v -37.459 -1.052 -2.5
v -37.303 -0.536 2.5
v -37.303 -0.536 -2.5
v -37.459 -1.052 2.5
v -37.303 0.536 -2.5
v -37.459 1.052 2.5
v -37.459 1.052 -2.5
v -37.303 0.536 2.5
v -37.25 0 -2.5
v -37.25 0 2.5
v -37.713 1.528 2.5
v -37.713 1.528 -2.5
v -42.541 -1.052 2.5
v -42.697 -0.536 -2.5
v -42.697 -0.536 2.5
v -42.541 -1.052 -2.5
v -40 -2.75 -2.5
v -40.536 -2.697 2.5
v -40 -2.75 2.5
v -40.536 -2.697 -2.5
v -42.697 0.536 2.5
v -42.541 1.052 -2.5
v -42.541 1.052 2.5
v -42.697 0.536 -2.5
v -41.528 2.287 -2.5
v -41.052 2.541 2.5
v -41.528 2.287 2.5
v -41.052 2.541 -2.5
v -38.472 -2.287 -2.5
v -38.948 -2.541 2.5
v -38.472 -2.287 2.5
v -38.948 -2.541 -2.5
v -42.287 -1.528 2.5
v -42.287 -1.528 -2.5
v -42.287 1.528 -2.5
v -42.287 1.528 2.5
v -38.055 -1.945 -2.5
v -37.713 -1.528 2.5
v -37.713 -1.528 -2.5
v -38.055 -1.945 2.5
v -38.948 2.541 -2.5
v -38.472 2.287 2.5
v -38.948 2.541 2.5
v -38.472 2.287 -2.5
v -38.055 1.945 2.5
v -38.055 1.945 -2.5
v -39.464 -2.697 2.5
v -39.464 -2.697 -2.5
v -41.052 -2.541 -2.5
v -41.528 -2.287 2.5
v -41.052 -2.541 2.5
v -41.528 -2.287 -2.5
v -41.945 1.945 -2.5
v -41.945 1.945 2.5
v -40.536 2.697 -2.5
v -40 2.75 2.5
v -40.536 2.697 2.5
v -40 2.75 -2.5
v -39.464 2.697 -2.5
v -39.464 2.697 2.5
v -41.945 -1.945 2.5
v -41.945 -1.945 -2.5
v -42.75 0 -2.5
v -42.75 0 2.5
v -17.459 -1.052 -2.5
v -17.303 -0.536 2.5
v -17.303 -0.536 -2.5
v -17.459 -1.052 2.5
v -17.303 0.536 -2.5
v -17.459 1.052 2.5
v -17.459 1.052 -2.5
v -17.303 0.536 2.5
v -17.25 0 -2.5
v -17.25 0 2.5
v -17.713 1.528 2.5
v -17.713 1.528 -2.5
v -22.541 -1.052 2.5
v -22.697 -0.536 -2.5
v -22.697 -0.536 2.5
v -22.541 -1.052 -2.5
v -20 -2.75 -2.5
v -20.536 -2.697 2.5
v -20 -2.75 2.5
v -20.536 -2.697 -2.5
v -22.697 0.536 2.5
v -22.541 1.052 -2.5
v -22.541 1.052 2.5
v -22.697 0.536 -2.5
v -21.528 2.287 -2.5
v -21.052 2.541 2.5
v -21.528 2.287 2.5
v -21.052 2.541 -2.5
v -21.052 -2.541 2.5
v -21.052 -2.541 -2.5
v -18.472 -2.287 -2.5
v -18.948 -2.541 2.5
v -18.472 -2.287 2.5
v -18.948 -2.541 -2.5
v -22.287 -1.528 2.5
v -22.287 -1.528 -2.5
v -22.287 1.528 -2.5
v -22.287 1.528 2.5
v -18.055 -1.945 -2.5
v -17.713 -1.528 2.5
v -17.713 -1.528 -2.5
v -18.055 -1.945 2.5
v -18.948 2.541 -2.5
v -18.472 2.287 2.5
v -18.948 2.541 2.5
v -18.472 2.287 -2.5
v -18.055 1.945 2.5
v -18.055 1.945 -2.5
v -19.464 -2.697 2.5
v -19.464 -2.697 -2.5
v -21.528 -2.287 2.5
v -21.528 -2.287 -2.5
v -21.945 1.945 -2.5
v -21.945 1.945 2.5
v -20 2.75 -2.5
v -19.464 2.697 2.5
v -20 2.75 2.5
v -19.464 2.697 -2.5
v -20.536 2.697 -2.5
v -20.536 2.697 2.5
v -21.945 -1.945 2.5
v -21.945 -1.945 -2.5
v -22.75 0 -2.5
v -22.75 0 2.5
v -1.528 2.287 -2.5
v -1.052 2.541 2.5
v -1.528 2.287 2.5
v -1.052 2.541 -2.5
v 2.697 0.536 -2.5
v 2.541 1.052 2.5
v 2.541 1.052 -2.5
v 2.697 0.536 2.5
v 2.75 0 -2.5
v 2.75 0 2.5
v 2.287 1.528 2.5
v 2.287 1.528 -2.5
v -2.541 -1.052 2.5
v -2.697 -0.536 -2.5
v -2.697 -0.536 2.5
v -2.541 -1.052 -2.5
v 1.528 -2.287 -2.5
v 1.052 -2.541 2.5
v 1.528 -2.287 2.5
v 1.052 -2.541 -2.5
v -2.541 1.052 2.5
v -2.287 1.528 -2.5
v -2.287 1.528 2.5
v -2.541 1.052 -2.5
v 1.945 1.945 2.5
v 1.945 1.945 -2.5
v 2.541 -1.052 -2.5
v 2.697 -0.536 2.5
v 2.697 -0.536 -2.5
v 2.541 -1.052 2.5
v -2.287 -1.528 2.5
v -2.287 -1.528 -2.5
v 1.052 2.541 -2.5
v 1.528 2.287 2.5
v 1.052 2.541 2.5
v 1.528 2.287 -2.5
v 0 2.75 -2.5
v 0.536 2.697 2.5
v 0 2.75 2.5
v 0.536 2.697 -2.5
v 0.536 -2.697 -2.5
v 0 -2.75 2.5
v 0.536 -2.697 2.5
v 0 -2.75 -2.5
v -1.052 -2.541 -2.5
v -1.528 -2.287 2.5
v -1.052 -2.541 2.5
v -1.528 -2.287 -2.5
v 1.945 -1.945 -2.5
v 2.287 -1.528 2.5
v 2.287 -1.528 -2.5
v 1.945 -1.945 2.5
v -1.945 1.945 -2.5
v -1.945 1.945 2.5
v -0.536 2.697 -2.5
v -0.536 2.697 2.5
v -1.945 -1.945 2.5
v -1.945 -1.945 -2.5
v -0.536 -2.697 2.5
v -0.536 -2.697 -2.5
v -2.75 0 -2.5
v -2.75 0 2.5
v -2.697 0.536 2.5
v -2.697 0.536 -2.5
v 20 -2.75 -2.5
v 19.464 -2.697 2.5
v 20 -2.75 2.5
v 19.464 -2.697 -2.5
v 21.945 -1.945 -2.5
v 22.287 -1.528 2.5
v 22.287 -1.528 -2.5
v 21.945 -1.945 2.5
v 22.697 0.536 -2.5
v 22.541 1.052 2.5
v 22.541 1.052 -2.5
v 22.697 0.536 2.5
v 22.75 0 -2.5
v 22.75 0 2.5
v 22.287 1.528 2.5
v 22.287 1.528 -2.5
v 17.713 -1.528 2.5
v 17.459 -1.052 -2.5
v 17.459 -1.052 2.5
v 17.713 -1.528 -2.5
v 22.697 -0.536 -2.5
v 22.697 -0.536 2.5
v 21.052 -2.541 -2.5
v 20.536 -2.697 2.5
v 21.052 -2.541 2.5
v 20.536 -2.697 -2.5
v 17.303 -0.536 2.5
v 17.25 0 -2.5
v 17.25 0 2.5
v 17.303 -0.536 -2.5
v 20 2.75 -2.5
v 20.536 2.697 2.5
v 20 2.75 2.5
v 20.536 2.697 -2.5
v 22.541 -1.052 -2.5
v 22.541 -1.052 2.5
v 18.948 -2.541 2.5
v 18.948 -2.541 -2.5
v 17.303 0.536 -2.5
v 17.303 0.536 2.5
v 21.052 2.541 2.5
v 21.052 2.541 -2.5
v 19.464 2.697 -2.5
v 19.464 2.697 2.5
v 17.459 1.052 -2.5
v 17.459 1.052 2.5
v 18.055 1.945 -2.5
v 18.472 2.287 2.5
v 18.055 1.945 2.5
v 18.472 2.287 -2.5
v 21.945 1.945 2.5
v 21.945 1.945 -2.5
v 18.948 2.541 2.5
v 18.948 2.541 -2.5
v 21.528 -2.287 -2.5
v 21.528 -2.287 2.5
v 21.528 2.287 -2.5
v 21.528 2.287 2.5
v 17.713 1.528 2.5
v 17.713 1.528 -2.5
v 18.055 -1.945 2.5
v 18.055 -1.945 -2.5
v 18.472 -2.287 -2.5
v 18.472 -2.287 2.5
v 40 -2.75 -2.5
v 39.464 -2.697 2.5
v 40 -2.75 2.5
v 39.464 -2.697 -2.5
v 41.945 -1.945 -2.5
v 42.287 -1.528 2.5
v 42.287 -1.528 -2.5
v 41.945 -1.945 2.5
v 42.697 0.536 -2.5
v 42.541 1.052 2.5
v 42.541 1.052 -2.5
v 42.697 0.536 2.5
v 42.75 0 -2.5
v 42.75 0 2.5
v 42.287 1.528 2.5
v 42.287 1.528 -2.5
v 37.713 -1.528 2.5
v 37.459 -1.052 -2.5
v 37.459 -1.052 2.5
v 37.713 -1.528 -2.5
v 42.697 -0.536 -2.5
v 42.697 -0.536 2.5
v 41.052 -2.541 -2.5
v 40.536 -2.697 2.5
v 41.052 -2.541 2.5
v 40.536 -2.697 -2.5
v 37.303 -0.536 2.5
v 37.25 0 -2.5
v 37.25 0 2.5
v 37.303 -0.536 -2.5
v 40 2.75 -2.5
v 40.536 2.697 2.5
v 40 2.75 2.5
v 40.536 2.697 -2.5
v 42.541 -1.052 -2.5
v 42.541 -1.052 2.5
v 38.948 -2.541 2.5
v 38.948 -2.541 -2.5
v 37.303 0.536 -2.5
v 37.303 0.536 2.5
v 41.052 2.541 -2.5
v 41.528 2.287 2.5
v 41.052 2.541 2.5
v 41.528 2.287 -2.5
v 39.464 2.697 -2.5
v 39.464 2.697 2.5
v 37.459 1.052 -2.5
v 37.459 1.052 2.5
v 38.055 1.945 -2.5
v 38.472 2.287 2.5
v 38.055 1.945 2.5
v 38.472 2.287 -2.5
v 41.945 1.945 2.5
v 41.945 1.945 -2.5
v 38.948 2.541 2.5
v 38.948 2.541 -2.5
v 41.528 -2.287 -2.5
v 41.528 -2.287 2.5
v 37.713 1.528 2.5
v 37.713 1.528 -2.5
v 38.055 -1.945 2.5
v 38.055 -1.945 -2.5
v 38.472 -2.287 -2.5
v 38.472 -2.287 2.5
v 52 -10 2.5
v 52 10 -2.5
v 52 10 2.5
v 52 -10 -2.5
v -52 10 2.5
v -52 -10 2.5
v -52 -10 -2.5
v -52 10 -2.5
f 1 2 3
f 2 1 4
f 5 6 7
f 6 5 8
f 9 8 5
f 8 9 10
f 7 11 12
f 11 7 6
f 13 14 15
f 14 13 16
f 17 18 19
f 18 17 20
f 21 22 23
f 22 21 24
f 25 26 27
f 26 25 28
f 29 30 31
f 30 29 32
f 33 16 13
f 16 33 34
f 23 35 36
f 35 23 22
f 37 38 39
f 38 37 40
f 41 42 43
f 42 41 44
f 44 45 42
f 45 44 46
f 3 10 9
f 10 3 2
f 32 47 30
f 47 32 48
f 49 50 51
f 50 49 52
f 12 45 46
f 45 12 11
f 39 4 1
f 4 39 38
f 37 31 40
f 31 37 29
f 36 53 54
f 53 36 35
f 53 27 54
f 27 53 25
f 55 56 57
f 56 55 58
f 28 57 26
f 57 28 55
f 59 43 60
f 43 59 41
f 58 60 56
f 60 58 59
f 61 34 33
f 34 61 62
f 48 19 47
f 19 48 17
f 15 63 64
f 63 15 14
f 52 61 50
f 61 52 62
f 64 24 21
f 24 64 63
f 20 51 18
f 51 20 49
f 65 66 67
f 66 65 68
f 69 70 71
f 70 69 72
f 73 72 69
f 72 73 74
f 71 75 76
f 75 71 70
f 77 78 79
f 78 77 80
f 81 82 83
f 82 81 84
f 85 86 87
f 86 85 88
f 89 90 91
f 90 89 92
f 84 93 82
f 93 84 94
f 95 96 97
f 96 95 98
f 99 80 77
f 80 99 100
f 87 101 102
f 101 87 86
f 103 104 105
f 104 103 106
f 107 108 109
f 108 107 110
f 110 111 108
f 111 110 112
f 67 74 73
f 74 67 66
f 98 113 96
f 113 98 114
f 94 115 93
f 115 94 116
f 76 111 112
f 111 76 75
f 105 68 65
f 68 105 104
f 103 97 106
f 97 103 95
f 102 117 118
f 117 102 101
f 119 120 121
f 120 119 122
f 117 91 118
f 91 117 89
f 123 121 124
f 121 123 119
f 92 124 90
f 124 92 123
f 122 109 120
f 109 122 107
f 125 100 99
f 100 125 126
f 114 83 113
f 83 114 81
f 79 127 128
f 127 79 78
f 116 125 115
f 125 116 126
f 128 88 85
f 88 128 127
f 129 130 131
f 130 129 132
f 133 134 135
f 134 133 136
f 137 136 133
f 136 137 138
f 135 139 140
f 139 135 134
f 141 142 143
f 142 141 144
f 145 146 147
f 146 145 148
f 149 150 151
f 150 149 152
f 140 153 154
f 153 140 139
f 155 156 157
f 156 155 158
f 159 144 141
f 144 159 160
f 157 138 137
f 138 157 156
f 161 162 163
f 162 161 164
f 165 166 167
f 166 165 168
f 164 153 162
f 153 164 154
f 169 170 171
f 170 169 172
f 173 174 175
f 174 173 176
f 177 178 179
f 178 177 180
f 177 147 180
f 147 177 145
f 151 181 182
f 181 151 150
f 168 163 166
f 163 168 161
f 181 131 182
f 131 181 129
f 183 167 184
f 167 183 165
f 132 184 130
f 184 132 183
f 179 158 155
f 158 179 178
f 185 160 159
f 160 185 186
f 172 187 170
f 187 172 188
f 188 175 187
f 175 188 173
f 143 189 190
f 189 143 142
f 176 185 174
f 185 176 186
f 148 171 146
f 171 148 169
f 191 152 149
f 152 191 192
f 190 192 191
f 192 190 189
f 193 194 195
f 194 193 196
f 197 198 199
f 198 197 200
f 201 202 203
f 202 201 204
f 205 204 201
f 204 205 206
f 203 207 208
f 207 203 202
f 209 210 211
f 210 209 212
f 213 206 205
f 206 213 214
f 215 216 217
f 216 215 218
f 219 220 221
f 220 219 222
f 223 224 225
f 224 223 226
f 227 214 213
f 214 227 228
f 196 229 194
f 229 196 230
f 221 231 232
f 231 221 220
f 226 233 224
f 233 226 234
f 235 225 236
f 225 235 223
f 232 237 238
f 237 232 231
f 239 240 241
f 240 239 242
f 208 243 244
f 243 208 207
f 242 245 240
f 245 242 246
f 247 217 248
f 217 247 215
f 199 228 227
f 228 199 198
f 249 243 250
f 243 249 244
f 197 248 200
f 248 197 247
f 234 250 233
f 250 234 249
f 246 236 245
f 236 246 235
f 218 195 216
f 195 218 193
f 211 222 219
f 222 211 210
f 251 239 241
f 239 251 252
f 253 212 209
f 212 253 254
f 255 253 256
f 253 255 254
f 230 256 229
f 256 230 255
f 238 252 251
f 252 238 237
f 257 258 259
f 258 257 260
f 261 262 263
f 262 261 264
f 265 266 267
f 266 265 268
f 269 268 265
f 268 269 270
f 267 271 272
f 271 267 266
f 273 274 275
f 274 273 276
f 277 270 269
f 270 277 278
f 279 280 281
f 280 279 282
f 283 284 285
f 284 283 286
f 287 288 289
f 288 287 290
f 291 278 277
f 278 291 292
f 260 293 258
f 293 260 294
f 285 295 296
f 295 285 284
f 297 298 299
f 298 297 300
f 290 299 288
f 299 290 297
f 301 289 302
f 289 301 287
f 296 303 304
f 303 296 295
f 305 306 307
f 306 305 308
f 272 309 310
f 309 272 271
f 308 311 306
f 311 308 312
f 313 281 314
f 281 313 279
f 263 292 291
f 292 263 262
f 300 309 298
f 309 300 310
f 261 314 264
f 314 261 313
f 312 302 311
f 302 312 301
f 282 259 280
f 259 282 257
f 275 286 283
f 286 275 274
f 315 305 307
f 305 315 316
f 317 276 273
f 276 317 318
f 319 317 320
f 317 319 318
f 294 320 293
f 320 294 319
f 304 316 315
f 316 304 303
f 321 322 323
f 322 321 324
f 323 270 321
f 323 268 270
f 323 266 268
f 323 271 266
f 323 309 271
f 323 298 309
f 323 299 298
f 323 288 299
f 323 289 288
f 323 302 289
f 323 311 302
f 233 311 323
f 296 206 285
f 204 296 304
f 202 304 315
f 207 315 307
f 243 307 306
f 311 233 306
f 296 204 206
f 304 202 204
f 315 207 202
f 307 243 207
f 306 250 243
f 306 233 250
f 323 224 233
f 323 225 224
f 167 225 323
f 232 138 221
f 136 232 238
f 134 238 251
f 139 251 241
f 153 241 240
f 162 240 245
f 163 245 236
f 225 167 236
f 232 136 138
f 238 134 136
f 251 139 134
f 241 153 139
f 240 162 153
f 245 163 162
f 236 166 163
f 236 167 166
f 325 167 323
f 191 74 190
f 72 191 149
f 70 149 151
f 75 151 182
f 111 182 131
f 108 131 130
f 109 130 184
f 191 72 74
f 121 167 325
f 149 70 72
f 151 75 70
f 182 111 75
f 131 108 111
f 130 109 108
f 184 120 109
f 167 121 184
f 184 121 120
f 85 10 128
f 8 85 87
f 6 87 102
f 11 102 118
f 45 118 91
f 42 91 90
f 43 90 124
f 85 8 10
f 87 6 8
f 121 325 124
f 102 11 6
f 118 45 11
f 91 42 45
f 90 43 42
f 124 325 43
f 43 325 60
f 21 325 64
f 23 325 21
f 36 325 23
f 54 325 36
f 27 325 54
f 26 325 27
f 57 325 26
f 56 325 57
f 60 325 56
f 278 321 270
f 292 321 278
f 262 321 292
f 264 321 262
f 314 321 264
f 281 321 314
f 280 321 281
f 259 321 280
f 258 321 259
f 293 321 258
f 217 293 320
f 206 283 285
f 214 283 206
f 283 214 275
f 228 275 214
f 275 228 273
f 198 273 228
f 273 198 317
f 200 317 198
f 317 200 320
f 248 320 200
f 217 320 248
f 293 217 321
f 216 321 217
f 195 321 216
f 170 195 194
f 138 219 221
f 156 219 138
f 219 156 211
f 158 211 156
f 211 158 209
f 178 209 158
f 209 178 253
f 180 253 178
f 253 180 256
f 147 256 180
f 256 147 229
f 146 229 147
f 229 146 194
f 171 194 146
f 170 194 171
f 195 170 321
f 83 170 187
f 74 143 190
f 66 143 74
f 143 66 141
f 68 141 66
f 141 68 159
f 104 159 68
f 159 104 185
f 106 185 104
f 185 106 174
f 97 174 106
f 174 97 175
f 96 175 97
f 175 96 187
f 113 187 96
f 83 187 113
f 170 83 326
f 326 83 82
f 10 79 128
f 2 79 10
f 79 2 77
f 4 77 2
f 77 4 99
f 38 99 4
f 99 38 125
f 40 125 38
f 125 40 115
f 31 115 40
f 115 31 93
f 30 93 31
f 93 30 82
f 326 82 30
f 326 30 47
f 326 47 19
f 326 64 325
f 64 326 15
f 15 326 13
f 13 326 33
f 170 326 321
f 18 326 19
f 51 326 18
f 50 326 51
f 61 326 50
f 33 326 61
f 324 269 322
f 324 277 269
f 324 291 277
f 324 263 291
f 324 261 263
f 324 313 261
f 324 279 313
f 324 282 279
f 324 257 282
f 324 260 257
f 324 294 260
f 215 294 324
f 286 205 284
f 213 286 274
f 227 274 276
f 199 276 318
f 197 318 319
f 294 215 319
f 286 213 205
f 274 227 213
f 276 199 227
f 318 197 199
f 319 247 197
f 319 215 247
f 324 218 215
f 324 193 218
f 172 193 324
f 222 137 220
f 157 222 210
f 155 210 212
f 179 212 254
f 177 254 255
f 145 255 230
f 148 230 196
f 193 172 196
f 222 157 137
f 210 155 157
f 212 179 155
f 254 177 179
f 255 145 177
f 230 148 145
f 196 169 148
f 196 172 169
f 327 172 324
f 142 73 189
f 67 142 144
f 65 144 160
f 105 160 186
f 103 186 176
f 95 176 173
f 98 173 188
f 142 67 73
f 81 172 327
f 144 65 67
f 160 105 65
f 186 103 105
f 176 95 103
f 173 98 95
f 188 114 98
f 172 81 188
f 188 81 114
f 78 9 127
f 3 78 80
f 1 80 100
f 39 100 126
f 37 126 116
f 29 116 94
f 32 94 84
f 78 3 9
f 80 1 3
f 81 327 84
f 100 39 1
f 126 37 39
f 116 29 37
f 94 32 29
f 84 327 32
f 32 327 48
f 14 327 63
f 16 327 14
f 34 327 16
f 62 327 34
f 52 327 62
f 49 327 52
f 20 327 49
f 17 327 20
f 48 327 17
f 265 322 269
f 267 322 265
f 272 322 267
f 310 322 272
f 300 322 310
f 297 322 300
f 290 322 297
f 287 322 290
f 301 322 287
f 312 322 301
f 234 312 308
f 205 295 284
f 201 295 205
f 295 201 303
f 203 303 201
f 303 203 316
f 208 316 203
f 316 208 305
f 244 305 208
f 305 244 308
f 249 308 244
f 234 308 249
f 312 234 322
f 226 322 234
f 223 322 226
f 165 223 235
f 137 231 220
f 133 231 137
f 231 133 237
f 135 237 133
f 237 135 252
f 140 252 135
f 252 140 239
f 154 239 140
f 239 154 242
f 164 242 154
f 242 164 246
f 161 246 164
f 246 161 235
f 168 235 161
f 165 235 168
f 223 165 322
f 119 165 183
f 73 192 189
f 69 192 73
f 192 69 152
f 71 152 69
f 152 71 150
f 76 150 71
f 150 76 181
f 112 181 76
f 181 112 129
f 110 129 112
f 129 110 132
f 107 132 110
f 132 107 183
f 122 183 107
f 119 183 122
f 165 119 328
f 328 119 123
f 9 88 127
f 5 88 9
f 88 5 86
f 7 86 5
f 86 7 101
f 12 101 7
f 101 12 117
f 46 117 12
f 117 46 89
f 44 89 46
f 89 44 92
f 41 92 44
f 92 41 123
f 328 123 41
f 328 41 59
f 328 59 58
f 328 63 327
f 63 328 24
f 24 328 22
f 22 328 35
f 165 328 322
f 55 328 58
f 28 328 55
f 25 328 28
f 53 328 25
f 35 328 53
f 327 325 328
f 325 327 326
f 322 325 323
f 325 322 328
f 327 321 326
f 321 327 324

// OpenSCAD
$fn = 32;

// ----------------------------------------------------------------------
// Hole bar, 5 x Ø5.5
// row layout, 12 mm edge offset
// ----------------------------------------------------------------------

// --- parameters (mm) ---
bar_w = 20;    // bar width (Y)
bar_t = 5;     // bar thickness (Z)
holes = 5;     // holes per row
hole_d = 5.5;  // hole diameter
edge = 12;     // offset from the bar end to the first hole
pitch = 20;    // pitch between neighbouring holes

// --- derived feature positions (mm) ---
span = (holes - 1) * pitch;   // = 80   distance between the end holes
bar_l = span + 2 * edge;      // = 104   overall bar length
start_x = -bar_l / 2 + edge;  // = -40   X of the first hole
feature_centers = [
  [start_x + 0 * pitch, 0],
  [start_x + 1 * pitch, 0],
  [start_x + 2 * pitch, 0],
  [start_x + 3 * pitch, 0],
  [start_x + 4 * pitch, 0]
];   // hole centres of the first row

// bar with one row of holes, drilled from feature_centers
difference() {
  translate([-bar_l / 2, -bar_w / 2, -bar_t / 2]) cube([bar_l, bar_w, bar_t]);
  for (centre = feature_centers)
    translate([centre[0], centre[1], 0])
      cylinder(d = hole_d, h = bar_t + 2, center = true);
}
